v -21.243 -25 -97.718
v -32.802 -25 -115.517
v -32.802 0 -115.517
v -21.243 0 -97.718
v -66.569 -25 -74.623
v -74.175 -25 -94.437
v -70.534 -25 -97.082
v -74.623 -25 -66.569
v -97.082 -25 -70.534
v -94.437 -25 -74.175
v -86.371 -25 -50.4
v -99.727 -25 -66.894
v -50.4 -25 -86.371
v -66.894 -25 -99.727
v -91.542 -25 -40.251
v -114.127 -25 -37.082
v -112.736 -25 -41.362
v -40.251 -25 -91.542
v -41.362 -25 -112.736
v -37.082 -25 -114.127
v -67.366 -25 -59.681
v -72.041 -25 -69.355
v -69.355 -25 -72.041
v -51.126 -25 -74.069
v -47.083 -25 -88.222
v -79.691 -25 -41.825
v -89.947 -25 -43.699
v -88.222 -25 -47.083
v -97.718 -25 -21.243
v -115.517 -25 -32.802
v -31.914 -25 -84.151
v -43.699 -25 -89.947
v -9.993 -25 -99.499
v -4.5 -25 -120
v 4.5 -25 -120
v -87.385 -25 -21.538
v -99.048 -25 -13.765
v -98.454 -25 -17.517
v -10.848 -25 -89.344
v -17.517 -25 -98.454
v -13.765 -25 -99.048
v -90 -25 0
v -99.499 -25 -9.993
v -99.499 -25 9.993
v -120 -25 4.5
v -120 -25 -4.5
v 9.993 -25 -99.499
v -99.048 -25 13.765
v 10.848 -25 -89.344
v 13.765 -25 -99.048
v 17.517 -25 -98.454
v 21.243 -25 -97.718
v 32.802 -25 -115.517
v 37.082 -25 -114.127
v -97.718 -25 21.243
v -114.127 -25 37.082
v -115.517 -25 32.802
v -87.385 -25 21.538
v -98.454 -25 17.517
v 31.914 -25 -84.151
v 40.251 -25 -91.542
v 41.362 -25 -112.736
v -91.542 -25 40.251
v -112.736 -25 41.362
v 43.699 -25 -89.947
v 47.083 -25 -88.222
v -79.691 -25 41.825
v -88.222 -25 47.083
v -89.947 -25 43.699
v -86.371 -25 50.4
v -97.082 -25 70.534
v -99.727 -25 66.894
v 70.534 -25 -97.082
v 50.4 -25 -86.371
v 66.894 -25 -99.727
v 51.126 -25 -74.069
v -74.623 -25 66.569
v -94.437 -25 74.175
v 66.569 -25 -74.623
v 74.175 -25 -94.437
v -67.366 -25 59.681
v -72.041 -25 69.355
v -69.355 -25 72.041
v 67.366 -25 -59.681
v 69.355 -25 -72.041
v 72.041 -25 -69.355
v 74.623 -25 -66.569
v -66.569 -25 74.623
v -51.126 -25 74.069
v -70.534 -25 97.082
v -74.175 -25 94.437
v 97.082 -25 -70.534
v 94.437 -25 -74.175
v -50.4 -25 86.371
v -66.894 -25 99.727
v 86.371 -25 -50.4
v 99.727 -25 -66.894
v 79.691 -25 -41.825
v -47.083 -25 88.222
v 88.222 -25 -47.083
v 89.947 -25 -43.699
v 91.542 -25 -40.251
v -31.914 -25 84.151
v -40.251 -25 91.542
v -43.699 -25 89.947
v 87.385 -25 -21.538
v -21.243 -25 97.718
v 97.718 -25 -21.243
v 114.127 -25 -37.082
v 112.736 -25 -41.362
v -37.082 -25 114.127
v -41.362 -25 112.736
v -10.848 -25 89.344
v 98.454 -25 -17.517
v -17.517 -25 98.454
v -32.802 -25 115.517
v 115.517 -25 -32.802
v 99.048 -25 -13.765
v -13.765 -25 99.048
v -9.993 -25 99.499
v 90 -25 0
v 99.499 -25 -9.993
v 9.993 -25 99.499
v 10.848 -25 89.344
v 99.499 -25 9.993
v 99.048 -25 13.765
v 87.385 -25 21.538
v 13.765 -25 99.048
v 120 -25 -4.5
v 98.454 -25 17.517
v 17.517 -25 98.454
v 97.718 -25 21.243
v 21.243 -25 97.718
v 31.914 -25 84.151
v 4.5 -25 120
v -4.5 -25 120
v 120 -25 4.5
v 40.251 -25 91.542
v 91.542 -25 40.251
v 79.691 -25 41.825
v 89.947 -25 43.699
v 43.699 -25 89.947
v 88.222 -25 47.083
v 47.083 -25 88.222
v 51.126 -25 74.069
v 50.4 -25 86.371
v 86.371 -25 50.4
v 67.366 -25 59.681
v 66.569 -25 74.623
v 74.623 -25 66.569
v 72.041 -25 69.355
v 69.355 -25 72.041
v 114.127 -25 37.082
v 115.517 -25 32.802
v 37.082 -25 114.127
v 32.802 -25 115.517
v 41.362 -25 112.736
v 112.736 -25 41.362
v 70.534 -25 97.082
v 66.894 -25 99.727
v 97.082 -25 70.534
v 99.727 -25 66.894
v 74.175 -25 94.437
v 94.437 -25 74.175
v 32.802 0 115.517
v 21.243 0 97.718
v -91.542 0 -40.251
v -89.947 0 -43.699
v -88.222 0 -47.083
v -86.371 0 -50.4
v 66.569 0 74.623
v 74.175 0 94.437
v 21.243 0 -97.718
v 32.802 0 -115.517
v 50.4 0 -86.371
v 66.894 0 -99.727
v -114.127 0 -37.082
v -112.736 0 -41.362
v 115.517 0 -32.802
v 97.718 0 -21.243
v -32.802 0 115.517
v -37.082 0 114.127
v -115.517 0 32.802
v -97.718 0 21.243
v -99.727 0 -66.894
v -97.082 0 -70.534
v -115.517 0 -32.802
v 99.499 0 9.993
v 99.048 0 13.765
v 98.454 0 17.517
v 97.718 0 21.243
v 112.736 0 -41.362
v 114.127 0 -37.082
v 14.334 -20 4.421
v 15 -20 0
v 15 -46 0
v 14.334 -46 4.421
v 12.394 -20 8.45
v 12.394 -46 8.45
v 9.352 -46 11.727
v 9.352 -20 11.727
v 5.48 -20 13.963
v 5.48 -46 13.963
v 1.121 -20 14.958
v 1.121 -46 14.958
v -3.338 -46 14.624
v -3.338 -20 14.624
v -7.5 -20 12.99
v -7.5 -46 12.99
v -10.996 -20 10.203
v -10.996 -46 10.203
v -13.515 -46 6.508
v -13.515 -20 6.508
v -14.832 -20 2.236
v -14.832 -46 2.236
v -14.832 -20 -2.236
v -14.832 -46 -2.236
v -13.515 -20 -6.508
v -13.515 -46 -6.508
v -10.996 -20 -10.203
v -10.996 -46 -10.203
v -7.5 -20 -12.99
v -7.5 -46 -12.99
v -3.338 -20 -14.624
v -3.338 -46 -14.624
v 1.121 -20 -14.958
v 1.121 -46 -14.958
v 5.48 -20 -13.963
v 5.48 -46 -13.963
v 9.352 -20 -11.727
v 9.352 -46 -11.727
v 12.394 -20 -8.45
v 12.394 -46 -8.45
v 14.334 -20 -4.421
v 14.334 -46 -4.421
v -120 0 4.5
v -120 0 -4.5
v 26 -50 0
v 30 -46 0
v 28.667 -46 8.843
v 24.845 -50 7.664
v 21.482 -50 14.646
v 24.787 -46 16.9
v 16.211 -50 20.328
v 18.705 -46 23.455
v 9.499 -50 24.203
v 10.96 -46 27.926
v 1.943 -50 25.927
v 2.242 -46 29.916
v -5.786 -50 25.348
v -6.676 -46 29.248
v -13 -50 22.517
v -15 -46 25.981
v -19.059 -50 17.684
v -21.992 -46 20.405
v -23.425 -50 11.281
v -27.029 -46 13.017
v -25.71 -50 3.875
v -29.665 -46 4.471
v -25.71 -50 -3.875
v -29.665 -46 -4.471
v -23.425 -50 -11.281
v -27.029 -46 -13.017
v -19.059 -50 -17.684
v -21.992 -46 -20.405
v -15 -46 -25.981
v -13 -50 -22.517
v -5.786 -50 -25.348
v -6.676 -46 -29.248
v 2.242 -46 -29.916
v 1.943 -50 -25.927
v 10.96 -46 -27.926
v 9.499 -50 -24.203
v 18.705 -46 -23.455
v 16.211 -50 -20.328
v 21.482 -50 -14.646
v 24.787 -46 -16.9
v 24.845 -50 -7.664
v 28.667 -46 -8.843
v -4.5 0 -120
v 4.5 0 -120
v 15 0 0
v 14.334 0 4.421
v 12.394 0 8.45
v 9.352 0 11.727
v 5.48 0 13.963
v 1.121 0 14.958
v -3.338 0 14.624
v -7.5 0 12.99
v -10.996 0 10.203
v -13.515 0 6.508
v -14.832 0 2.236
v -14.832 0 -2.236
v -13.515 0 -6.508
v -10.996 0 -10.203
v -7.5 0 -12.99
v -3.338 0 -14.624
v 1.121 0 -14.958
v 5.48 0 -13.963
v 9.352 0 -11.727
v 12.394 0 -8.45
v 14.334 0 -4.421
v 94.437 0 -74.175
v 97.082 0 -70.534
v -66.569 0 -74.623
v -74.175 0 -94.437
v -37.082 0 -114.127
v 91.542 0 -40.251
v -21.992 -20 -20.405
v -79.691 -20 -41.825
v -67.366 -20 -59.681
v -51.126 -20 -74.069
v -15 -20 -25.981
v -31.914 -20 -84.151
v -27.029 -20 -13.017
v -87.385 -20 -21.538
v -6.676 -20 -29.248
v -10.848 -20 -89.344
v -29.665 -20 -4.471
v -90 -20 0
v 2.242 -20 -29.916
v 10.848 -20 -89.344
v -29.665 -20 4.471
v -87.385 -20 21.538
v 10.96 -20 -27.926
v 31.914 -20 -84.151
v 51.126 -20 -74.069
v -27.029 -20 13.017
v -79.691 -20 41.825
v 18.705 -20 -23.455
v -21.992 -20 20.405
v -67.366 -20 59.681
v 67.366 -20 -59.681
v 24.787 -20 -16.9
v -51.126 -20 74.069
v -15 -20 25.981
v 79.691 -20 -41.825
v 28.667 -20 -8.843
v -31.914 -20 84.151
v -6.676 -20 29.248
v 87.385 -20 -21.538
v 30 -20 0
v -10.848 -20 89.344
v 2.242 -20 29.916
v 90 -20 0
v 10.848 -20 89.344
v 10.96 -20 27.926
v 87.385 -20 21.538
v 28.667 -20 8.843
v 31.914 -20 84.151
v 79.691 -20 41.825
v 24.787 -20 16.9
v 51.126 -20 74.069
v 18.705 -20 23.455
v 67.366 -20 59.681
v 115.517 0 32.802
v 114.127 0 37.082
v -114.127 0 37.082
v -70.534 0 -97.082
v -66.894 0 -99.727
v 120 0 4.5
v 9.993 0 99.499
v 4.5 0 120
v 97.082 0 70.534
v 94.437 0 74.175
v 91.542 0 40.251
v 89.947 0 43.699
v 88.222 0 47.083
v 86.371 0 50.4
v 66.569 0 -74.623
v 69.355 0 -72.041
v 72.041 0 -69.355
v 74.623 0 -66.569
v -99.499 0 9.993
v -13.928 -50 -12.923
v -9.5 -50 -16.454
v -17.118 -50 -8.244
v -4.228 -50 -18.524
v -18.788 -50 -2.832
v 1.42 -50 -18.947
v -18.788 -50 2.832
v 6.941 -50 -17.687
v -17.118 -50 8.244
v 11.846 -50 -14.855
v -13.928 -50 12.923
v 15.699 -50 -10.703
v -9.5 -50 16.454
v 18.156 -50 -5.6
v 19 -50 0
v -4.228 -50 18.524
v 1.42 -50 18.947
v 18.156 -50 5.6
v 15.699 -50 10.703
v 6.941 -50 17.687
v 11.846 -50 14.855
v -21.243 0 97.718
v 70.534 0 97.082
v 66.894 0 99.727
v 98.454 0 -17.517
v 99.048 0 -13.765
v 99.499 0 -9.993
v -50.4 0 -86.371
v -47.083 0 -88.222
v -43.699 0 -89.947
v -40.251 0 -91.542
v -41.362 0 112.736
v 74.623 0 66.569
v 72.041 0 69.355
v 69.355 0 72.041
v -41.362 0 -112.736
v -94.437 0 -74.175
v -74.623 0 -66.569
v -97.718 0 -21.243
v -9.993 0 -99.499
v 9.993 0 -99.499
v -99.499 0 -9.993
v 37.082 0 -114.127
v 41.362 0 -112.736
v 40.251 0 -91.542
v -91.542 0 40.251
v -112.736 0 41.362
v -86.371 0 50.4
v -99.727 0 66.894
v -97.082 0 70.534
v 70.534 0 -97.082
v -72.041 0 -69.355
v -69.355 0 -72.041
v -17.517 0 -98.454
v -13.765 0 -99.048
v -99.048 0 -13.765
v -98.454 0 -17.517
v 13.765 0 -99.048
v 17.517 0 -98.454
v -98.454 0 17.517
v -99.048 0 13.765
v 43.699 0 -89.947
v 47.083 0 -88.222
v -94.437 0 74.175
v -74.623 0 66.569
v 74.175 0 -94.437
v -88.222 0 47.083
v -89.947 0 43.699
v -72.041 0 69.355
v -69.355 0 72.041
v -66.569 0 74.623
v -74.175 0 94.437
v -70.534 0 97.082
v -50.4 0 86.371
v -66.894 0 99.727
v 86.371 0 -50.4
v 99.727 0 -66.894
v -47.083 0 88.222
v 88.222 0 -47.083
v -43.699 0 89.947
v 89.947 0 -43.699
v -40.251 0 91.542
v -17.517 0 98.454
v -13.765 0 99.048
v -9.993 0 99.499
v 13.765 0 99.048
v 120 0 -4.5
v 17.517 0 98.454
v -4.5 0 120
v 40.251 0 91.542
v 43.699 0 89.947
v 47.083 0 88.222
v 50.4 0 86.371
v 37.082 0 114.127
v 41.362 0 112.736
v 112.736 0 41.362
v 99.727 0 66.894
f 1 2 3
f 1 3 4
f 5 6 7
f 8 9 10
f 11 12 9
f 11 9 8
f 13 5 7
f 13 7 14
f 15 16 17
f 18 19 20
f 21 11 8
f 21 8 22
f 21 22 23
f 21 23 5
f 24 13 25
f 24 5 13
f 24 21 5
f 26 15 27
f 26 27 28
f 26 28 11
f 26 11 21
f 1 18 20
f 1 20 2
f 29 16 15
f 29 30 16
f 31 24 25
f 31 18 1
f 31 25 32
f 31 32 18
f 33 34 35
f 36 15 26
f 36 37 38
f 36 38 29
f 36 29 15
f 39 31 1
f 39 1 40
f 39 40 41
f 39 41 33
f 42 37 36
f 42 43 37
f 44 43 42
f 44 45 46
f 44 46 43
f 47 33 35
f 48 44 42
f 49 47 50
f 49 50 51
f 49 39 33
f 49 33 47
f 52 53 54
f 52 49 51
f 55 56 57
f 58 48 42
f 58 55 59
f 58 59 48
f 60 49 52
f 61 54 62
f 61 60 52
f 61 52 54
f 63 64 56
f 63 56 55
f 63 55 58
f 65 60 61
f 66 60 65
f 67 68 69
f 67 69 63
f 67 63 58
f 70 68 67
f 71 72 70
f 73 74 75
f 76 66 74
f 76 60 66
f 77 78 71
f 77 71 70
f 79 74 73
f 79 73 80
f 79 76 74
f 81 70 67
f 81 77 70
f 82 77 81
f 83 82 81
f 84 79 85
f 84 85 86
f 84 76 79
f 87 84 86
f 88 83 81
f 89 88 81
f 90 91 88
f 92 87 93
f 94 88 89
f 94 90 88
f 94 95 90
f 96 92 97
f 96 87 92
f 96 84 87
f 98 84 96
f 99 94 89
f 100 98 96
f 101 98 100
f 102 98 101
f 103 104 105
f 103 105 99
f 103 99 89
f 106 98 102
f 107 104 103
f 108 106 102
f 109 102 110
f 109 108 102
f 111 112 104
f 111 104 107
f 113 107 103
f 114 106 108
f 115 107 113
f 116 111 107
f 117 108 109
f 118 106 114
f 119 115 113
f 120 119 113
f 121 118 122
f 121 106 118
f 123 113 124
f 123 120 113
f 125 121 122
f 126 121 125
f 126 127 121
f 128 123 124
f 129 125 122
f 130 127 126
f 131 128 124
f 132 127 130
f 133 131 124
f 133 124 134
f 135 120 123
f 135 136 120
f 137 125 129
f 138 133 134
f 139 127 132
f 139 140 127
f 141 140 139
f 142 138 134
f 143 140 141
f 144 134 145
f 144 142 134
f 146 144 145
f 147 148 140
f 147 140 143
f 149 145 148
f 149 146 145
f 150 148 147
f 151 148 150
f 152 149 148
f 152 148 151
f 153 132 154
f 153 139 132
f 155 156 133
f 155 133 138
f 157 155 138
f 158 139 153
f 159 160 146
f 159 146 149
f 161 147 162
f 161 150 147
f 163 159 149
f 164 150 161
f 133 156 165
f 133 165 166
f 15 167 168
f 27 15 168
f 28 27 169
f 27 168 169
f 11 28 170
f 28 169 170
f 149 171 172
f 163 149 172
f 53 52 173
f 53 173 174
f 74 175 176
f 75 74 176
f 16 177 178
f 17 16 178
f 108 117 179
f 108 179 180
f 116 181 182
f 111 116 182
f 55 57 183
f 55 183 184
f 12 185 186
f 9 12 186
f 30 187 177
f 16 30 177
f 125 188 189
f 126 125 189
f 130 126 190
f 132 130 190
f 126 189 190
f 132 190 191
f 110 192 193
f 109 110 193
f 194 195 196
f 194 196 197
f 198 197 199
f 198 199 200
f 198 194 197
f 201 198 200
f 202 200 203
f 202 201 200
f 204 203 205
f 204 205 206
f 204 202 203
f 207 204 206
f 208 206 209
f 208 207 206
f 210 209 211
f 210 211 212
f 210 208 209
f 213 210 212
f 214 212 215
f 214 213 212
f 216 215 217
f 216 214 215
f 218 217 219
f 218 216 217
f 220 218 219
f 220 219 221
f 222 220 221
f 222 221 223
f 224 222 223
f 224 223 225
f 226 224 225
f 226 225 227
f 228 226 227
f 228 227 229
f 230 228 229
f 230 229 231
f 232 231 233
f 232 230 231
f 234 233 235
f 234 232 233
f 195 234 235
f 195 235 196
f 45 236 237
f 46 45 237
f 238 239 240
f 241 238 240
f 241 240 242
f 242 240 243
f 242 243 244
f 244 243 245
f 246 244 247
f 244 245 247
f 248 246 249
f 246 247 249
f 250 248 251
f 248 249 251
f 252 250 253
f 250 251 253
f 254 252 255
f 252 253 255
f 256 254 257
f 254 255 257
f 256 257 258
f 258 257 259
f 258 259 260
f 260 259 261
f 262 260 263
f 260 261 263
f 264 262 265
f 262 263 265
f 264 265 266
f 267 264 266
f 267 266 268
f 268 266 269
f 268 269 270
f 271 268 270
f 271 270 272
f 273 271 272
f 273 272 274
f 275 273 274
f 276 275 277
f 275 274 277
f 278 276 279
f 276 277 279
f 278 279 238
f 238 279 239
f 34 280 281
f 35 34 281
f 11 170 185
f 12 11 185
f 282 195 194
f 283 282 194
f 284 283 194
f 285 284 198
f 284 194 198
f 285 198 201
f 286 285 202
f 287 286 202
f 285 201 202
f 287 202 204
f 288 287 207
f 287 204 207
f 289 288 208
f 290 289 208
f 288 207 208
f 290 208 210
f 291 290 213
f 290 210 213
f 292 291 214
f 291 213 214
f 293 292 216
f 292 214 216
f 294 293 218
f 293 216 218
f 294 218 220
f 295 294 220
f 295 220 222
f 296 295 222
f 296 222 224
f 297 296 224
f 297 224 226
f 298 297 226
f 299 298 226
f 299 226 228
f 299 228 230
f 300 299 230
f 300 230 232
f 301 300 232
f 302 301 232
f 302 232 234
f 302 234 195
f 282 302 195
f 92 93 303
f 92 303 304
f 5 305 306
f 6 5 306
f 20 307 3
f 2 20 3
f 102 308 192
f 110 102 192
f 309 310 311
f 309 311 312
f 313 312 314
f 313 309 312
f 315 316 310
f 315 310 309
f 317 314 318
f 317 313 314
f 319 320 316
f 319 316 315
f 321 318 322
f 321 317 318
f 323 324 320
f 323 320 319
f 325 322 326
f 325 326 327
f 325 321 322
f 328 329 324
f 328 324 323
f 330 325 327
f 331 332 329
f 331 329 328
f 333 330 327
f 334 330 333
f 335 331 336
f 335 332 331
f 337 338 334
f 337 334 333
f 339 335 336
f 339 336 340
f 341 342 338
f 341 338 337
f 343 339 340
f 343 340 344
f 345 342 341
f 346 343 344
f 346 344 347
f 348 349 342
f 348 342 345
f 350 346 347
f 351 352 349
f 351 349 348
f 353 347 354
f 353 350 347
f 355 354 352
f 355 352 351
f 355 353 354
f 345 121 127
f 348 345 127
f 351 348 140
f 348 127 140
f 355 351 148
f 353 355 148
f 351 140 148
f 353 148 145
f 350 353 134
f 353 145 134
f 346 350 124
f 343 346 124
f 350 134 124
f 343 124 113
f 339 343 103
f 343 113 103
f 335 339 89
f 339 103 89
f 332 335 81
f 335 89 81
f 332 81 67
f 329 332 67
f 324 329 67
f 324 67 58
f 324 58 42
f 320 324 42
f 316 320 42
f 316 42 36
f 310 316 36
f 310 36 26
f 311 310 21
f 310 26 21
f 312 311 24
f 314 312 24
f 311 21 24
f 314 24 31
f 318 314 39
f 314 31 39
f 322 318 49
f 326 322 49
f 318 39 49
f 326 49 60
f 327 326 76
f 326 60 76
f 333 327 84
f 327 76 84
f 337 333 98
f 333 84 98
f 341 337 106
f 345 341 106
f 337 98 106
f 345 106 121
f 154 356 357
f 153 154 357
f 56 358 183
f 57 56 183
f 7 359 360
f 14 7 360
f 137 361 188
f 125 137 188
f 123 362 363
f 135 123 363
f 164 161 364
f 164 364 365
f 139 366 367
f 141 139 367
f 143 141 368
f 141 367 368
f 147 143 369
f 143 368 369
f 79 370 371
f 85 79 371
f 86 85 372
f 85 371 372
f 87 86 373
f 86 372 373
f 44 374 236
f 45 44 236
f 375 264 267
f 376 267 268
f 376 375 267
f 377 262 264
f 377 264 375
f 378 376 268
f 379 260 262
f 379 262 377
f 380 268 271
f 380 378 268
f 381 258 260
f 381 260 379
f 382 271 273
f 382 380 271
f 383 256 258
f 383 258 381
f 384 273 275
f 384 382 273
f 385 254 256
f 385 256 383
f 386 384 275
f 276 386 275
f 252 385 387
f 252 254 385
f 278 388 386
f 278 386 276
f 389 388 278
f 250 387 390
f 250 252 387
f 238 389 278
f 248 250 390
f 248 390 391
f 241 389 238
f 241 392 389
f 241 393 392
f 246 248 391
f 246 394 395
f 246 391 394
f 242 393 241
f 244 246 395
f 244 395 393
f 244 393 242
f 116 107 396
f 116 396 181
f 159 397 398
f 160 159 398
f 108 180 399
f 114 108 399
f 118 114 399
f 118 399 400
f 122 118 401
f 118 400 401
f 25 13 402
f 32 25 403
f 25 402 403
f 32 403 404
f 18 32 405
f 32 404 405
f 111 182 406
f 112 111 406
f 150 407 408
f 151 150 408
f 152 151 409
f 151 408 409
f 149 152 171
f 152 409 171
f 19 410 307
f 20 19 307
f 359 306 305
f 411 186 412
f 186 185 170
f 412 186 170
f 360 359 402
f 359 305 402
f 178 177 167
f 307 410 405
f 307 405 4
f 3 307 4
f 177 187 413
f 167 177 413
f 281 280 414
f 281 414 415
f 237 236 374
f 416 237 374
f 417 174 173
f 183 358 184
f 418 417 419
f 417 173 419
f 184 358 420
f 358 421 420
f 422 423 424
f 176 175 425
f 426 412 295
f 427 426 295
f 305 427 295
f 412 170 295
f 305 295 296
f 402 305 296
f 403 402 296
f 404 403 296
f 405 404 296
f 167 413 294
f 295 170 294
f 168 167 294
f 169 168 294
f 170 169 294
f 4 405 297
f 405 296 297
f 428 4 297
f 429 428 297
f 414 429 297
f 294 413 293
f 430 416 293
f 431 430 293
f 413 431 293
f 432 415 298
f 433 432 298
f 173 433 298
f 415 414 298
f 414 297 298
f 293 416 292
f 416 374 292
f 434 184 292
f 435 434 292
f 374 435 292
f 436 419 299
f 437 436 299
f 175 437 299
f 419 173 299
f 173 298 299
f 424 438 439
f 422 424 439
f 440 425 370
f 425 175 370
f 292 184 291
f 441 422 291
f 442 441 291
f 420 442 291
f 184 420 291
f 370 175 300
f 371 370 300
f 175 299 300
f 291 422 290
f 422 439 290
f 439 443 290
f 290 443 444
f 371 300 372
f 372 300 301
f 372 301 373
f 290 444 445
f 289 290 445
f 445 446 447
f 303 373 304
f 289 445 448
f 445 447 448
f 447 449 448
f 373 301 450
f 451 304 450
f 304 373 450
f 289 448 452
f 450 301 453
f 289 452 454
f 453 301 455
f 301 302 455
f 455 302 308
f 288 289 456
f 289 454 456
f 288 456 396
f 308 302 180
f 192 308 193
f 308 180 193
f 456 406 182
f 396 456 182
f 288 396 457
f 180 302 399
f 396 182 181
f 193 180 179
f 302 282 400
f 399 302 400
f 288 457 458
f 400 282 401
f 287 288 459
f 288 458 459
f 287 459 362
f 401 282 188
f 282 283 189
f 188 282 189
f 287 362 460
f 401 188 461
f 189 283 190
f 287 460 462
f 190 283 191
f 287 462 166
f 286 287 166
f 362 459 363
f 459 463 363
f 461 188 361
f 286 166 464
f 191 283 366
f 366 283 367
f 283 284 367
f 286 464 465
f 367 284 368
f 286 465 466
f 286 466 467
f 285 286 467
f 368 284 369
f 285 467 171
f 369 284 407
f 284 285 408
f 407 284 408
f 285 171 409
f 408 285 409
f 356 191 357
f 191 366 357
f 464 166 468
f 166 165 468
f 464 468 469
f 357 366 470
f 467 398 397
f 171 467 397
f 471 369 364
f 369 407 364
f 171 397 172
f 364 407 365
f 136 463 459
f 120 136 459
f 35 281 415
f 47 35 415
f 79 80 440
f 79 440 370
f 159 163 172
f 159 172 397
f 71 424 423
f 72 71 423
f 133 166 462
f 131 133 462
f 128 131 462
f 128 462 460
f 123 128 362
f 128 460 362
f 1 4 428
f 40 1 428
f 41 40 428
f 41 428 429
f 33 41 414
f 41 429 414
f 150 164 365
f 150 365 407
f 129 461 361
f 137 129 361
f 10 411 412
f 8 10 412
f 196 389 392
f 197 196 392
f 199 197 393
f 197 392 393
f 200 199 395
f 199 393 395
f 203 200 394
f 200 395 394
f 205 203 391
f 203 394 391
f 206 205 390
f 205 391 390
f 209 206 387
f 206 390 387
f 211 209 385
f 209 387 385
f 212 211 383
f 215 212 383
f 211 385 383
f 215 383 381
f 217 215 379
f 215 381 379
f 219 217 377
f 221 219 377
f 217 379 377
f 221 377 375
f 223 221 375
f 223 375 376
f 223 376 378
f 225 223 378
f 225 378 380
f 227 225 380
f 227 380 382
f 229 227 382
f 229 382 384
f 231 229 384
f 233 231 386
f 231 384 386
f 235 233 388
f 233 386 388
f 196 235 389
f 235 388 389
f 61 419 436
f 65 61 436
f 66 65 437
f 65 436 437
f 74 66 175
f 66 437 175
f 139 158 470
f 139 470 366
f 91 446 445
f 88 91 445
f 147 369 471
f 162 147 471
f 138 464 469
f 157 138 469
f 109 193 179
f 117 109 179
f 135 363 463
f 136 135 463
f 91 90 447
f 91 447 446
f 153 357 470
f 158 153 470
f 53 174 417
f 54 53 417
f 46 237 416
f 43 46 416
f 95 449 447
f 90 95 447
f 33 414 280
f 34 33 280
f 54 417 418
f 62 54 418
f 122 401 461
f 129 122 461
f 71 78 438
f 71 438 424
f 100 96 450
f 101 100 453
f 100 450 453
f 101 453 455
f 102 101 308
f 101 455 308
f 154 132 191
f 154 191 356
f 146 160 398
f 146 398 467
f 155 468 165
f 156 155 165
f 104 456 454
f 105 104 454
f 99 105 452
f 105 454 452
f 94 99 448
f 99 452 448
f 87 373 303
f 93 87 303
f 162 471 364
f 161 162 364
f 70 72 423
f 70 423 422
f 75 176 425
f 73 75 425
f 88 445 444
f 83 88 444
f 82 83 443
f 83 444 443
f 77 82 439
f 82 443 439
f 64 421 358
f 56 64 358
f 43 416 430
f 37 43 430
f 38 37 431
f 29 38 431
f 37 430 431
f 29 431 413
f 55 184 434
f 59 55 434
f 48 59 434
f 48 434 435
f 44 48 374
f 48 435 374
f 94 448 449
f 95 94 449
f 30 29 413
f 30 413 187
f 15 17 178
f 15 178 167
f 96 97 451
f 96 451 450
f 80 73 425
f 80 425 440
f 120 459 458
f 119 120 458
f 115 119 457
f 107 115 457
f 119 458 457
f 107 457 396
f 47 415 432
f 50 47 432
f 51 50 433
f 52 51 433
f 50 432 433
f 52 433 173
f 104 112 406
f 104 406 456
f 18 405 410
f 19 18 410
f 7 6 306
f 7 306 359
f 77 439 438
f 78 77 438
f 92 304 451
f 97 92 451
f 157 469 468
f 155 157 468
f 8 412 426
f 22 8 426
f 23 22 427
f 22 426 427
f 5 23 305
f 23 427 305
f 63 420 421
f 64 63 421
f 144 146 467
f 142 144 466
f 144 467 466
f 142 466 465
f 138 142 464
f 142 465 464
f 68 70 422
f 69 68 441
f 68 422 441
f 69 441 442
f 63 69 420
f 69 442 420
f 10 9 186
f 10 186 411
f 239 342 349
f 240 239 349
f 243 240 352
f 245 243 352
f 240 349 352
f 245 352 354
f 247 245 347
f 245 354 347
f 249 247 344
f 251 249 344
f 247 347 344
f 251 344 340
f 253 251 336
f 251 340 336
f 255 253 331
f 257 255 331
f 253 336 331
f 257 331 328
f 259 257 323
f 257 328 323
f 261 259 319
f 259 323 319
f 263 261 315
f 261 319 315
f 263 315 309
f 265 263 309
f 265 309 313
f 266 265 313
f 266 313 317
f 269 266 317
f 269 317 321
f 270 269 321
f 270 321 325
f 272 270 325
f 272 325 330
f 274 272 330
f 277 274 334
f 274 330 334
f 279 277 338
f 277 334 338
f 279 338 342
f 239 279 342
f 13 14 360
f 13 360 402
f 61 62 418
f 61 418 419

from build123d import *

# Parameters (mm, degrees)
F1_DEPTH  = 25
F2_R      = 90
F3_DEPTH  = 5
F4_R      = 30
F4_R_2    = 15
F5_DEPTH  = 30
F5_FACE_R = 15
F6_DEPTH  = 100
F7_SIZE   = 4


with BuildPart() as f1:
    # F0 (on Front) → F1 (new body)
    with BuildSketch(Plane.XZ):
        with BuildLine():
            ThreePointArc((99.499436, -9.99311), (99.874781, -5.002819), (100, 0))
            ThreePointArc((100, 0), (99.874781, 5.002819), (99.499436, 9.99311))
            ThreePointArc((99.499436, 9.99311), (98.768834, 15.643447), (97.717628, 21.243005))
            ThreePointArc((97.717628, 21.243005), (95.105652, 30.901699), (91.541546, 40.251029))
            ThreePointArc((91.541546, 40.251029), (89.100652, 45.39905), (86.370537, 50.399706))
            ThreePointArc((86.370537, 50.399706), (80.901699, 58.778525), (74.622932, 66.568897))
            ThreePointArc((74.622932, 66.568897), (70.710678, 70.710678), (66.568897, 74.622932))
            ThreePointArc((66.568897, 74.622932), (58.778525, 80.901699), (50.399706, 86.370537))
            ThreePointArc((50.399706, 86.370537), (45.39905, 89.100652), (40.251029, 91.541546))
            ThreePointArc((40.251029, 91.541546), (30.901699, 95.105652), (21.243005, 97.717628))
            ThreePointArc((21.243005, 97.717628), (15.643447, 98.768834), (9.99311, 99.499436))
            ThreePointArc((9.99311, 99.499436), (0, 100), (-9.99311, 99.499436))
            ThreePointArc((-9.99311, 99.499436), (-15.643447, 98.768834), (-21.243005, 97.717628))
            ThreePointArc((-21.243005, 97.717628), (-30.901699, 95.105652), (-40.251029, 91.541546))
            ThreePointArc((-40.251029, 91.541546), (-45.39905, 89.100652), (-50.399706, 86.370537))
            ThreePointArc((-50.399706, 86.370537), (-58.778525, 80.901699), (-66.568897, 74.622932))
            ThreePointArc((-66.568897, 74.622932), (-70.710678, 70.710678), (-74.622932, 66.568897))
            ThreePointArc((-74.622932, 66.568897), (-80.901699, 58.778525), (-86.370537, 50.399706))
            ThreePointArc((-86.370537, 50.399706), (-89.100652, 45.39905), (-91.541546, 40.251029))
            ThreePointArc((-91.541546, 40.251029), (-95.105652, 30.901699), (-97.717628, 21.243005))
            ThreePointArc((-97.717628, 21.243005), (-98.768834, 15.643447), (-99.499436, 9.99311))
            ThreePointArc((-99.499436, 9.99311), (-100, 0), (-99.499436, -9.99311))
            ThreePointArc((-99.499436, -9.99311), (-98.768834, -15.643447), (-97.717628, -21.243005))
            ThreePointArc((-97.717628, -21.243005), (-95.105652, -30.901699), (-91.541546, -40.251029))
            ThreePointArc((-91.541546, -40.251029), (-89.100652, -45.39905), (-86.370537, -50.399706))
            ThreePointArc((-86.370537, -50.399706), (-80.901699, -58.778525), (-74.622932, -66.568897))
            ThreePointArc((-74.622932, -66.568897), (-70.710678, -70.710678), (-66.568897, -74.622932))
            ThreePointArc((-66.568897, -74.622932), (-58.778525, -80.901699), (-50.399706, -86.370537))
            ThreePointArc((-50.399706, -86.370537), (-45.39905, -89.100652), (-40.251029, -91.541546))
            ThreePointArc((-40.251029, -91.541546), (-30.901699, -95.105652), (-21.243005, -97.717628))
            ThreePointArc((-21.243005, -97.717628), (-15.643447, -98.768834), (-9.99311, -99.499436))
            ThreePointArc((-9.99311, -99.499436), (0, -100), (9.99311, -99.499436))
            ThreePointArc((9.99311, -99.499436), (15.643447, -98.768834), (21.243005, -97.717628))
            ThreePointArc((21.243005, -97.717628), (30.901699, -95.105652), (40.251029, -91.541546))
            ThreePointArc((40.251029, -91.541546), (45.39905, -89.100652), (50.399706, -86.370537))
            ThreePointArc((50.399706, -86.370537), (58.778525, -80.901699), (66.568897, -74.622932))
            ThreePointArc((66.568897, -74.622932), (70.710678, -70.710678), (74.622932, -66.568897))
            ThreePointArc((74.622932, -66.568897), (80.901699, -58.778525), (86.370537, -50.399706))
            ThreePointArc((86.370537, -50.399706), (89.100652, -45.39905), (91.541546, -40.251029))
            ThreePointArc((91.541546, -40.251029), (95.105652, -30.901699), (97.717628, -21.243005))
            ThreePointArc((97.717628, -21.243005), (98.768834, -15.643447), (99.499436, -9.99311))
        make_face()
        with BuildLine():
            ThreePointArc((-99.499436, -9.99311), (-100, 0), (-99.499436, 9.99311))
            Line((-99.499436, 9.99311), (-120, 4.5))
            Line((-120, 4.5), (-120, 0))
            Line((-120, 0), (-120, -4.5))
            Line((-120, -4.5), (-99.499436, -9.99311))
        make_face()
        with BuildLine():
            ThreePointArc((-97.717628, 21.243005), (-95.105652, 30.901699), (-91.541546, 40.251029))
            Line((-91.541546, 40.251029), (-112.736205, 41.361794))
            Line((-112.736205, 41.361794), (-114.126782, 37.082039))
            Line((-114.126782, 37.082039), (-115.517358, 32.802285))
            Line((-115.517358, 32.802285), (-97.717628, 21.243005))
        make_face()
        with BuildLine():
            ThreePointArc((-86.370537, 50.399706), (-80.901699, 58.778525), (-74.622932, 66.568897))
            Line((-74.622932, 66.568897), (-94.437006, 74.174807))
            Line((-94.437006, 74.174807), (-97.082039, 70.53423))
            Line((-97.082039, 70.53423), (-99.727073, 66.893654))
            Line((-99.727073, 66.893654), (-86.370537, 50.399706))
        make_face()
        with BuildLine():
            ThreePointArc((-66.568897, 74.622932), (-58.778525, 80.901699), (-50.399706, 86.370537))
            Line((-50.399706, 86.370537), (-66.893654, 99.727073))
            Line((-66.893654, 99.727073), (-70.53423, 97.082039))
            Line((-70.53423, 97.082039), (-74.174807, 94.437006))
            Line((-74.174807, 94.437006), (-66.568897, 74.622932))
        make_face()
        with BuildLine():
            ThreePointArc((-40.251029, 91.541546), (-30.901699, 95.105652), (-21.243005, 97.717628))
            Line((-21.243005, 97.717628), (-32.802285, 115.517358))
            Line((-32.802285, 115.517358), (-37.082039, 114.126782))
            Line((-37.082039, 114.126782), (-41.361794, 112.736205))
            Line((-41.361794, 112.736205), (-40.251029, 91.541546))
        make_face()
        with BuildLine():
            ThreePointArc((-9.99311, 99.499436), (0, 100), (9.99311, 99.499436))
            Line((9.99311, 99.499436), (4.5, 120))
            Line((4.5, 120), (0, 120))
            Line((0, 120), (-4.5, 120))
            Line((-4.5, 120), (-9.99311, 99.499436))
        make_face()
        with BuildLine():
            ThreePointArc((21.243005, 97.717628), (30.901699, 95.105652), (40.251029, 91.541546))
            Line((40.251029, 91.541546), (41.361794, 112.736205))
            Line((41.361794, 112.736205), (37.082039, 114.126782))
            Line((37.082039, 114.126782), (32.802285, 115.517358))
            Line((32.802285, 115.517358), (21.243005, 97.717628))
        make_face()
        with BuildLine():
            ThreePointArc((50.399706, 86.370537), (58.778525, 80.901699), (66.568897, 74.622932))
            Line((66.568897, 74.622932), (74.174807, 94.437006))
            Line((74.174807, 94.437006), (70.53423, 97.082039))
            Line((70.53423, 97.082039), (66.893654, 99.727073))
            Line((66.893654, 99.727073), (50.399706, 86.370537))
        make_face()
        with BuildLine():
            ThreePointArc((74.622932, 66.568897), (80.901699, 58.778525), (86.370537, 50.399706))
            Line((86.370537, 50.399706), (99.727073, 66.893654))
            Line((99.727073, 66.893654), (97.082039, 70.53423))
            Line((97.082039, 70.53423), (94.437006, 74.174807))
            Line((94.437006, 74.174807), (74.622932, 66.568897))
        make_face()
        with BuildLine():
            ThreePointArc((91.541546, 40.251029), (95.105652, 30.901699), (97.717628, 21.243005))
            Line((97.717628, 21.243005), (115.517358, 32.802285))
            Line((115.517358, 32.802285), (114.126782, 37.082039))
            Line((114.126782, 37.082039), (112.736205, 41.361794))
            Line((112.736205, 41.361794), (91.541546, 40.251029))
        make_face()
        with BuildLine():
            ThreePointArc((99.499436, 9.99311), (99.874781, 5.002819), (100, 0))
            ThreePointArc((100, 0), (99.874781, -5.002819), (99.499436, -9.99311))
            Line((99.499436, -9.99311), (120, -4.5))
            Line((120, -4.5), (120, 0))
            Line((120, 0), (120, 4.5))
            Line((120, 4.5), (99.499436, 9.99311))
        make_face()
        with BuildLine():
            Line((115.517358, -32.802285), (97.717628, -21.243005))
            ThreePointArc((97.717628, -21.243005), (95.105652, -30.901699), (91.541546, -40.251029))
            Line((91.541546, -40.251029), (112.736205, -41.361794))
            Line((112.736205, -41.361794), (114.126782, -37.082039))
            Line((114.126782, -37.082039), (115.517358, -32.802285))
        make_face()
        with BuildLine():
            Line((99.727073, -66.893654), (86.370537, -50.399706))
            ThreePointArc((86.370537, -50.399706), (80.901699, -58.778525), (74.622932, -66.568897))
            Line((74.622932, -66.568897), (94.437006, -74.174807))
            Line((94.437006, -74.174807), (97.082039, -70.53423))
            Line((97.082039, -70.53423), (99.727073, -66.893654))
        make_face()
        with BuildLine():
            Line((74.174807, -94.437006), (66.568897, -74.622932))
            ThreePointArc((66.568897, -74.622932), (58.778525, -80.901699), (50.399706, -86.370537))
            Line((50.399706, -86.370537), (66.893654, -99.727073))
            Line((66.893654, -99.727073), (70.53423, -97.082039))
            Line((70.53423, -97.082039), (74.174807, -94.437006))
        make_face()
        with BuildLine():
            Line((41.361794, -112.736205), (40.251029, -91.541546))
            ThreePointArc((40.251029, -91.541546), (30.901699, -95.105652), (21.243005, -97.717628))
            Line((21.243005, -97.717628), (32.802285, -115.517358))
            Line((32.802285, -115.517358), (37.082039, -114.126782))
            Line((37.082039, -114.126782), (41.361794, -112.736205))
        make_face()
        with BuildLine():
            Line((4.5, -120), (9.99311, -99.499436))
            ThreePointArc((9.99311, -99.499436), (0, -100), (-9.99311, -99.499436))
            Line((-9.99311, -99.499436), (-4.5, -120))
            Line((-4.5, -120), (0, -120))
            Line((0, -120), (4.5, -120))
        make_face()
        with BuildLine():
            Line((-32.802285, -115.517358), (-21.243005, -97.717628))
            ThreePointArc((-21.243005, -97.717628), (-30.901699, -95.105652), (-40.251029, -91.541546))
            Line((-40.251029, -91.541546), (-41.361794, -112.736205))
            Line((-41.361794, -112.736205), (-37.082039, -114.126782))
            Line((-37.082039, -114.126782), (-32.802285, -115.517358))
        make_face()
        with BuildLine():
            Line((-66.893654, -99.727073), (-50.399706, -86.370537))
            ThreePointArc((-50.399706, -86.370537), (-58.778525, -80.901699), (-66.568897, -74.622932))
            Line((-66.568897, -74.622932), (-74.174807, -94.437006))
            Line((-74.174807, -94.437006), (-70.53423, -97.082039))
            Line((-70.53423, -97.082039), (-66.893654, -99.727073))
        make_face()
        with BuildLine():
            Line((-94.437006, -74.174807), (-74.622932, -66.568897))
            ThreePointArc((-74.622932, -66.568897), (-80.901699, -58.778525), (-86.370537, -50.399706))
            Line((-86.370537, -50.399706), (-99.727073, -66.893654))
            Line((-99.727073, -66.893654), (-97.082039, -70.53423))
            Line((-97.082039, -70.53423), (-94.437006, -74.174807))
        make_face()
        with BuildLine():
            Line((-112.736205, -41.361794), (-91.541546, -40.251029))
            ThreePointArc((-91.541546, -40.251029), (-95.105652, -30.901699), (-97.717628, -21.243005))
            Line((-97.717628, -21.243005), (-115.517358, -32.802285))
            Line((-115.517358, -32.802285), (-114.126782, -37.082039))
            Line((-114.126782, -37.082039), (-112.736205, -41.361794))
        make_face()
    extrude(amount=F1_DEPTH)

    # F2 (on face) → F3 (cut)
    with BuildSketch(Plane.XZ.offset(25)):
        Circle(F2_R)
    extrude(amount=-F3_DEPTH, mode=Mode.SUBTRACT)

    # F4 (on face) → F5 (join)
    with BuildSketch(Plane.XZ.offset(20)):
        Circle(F4_R)
        Circle(F4_R_2, mode=Mode.SUBTRACT)
    extrude(amount=F5_DEPTH)

    # F5_face (on face) → F6 (cut)
    with BuildSketch(Plane.XZ.offset(20)):
        Circle(F5_FACE_R)
    extrude(amount=-F6_DEPTH, mode=Mode.SUBTRACT)

    # F7
    f7_edges = [f1.edges().sort_by_distance(p)[0] for p in [
        (-30, -50, 0),
        (-15, -50, 0),
    ]]
    chamfer(f7_edges, length=F7_SIZE)


solid = f1.part
